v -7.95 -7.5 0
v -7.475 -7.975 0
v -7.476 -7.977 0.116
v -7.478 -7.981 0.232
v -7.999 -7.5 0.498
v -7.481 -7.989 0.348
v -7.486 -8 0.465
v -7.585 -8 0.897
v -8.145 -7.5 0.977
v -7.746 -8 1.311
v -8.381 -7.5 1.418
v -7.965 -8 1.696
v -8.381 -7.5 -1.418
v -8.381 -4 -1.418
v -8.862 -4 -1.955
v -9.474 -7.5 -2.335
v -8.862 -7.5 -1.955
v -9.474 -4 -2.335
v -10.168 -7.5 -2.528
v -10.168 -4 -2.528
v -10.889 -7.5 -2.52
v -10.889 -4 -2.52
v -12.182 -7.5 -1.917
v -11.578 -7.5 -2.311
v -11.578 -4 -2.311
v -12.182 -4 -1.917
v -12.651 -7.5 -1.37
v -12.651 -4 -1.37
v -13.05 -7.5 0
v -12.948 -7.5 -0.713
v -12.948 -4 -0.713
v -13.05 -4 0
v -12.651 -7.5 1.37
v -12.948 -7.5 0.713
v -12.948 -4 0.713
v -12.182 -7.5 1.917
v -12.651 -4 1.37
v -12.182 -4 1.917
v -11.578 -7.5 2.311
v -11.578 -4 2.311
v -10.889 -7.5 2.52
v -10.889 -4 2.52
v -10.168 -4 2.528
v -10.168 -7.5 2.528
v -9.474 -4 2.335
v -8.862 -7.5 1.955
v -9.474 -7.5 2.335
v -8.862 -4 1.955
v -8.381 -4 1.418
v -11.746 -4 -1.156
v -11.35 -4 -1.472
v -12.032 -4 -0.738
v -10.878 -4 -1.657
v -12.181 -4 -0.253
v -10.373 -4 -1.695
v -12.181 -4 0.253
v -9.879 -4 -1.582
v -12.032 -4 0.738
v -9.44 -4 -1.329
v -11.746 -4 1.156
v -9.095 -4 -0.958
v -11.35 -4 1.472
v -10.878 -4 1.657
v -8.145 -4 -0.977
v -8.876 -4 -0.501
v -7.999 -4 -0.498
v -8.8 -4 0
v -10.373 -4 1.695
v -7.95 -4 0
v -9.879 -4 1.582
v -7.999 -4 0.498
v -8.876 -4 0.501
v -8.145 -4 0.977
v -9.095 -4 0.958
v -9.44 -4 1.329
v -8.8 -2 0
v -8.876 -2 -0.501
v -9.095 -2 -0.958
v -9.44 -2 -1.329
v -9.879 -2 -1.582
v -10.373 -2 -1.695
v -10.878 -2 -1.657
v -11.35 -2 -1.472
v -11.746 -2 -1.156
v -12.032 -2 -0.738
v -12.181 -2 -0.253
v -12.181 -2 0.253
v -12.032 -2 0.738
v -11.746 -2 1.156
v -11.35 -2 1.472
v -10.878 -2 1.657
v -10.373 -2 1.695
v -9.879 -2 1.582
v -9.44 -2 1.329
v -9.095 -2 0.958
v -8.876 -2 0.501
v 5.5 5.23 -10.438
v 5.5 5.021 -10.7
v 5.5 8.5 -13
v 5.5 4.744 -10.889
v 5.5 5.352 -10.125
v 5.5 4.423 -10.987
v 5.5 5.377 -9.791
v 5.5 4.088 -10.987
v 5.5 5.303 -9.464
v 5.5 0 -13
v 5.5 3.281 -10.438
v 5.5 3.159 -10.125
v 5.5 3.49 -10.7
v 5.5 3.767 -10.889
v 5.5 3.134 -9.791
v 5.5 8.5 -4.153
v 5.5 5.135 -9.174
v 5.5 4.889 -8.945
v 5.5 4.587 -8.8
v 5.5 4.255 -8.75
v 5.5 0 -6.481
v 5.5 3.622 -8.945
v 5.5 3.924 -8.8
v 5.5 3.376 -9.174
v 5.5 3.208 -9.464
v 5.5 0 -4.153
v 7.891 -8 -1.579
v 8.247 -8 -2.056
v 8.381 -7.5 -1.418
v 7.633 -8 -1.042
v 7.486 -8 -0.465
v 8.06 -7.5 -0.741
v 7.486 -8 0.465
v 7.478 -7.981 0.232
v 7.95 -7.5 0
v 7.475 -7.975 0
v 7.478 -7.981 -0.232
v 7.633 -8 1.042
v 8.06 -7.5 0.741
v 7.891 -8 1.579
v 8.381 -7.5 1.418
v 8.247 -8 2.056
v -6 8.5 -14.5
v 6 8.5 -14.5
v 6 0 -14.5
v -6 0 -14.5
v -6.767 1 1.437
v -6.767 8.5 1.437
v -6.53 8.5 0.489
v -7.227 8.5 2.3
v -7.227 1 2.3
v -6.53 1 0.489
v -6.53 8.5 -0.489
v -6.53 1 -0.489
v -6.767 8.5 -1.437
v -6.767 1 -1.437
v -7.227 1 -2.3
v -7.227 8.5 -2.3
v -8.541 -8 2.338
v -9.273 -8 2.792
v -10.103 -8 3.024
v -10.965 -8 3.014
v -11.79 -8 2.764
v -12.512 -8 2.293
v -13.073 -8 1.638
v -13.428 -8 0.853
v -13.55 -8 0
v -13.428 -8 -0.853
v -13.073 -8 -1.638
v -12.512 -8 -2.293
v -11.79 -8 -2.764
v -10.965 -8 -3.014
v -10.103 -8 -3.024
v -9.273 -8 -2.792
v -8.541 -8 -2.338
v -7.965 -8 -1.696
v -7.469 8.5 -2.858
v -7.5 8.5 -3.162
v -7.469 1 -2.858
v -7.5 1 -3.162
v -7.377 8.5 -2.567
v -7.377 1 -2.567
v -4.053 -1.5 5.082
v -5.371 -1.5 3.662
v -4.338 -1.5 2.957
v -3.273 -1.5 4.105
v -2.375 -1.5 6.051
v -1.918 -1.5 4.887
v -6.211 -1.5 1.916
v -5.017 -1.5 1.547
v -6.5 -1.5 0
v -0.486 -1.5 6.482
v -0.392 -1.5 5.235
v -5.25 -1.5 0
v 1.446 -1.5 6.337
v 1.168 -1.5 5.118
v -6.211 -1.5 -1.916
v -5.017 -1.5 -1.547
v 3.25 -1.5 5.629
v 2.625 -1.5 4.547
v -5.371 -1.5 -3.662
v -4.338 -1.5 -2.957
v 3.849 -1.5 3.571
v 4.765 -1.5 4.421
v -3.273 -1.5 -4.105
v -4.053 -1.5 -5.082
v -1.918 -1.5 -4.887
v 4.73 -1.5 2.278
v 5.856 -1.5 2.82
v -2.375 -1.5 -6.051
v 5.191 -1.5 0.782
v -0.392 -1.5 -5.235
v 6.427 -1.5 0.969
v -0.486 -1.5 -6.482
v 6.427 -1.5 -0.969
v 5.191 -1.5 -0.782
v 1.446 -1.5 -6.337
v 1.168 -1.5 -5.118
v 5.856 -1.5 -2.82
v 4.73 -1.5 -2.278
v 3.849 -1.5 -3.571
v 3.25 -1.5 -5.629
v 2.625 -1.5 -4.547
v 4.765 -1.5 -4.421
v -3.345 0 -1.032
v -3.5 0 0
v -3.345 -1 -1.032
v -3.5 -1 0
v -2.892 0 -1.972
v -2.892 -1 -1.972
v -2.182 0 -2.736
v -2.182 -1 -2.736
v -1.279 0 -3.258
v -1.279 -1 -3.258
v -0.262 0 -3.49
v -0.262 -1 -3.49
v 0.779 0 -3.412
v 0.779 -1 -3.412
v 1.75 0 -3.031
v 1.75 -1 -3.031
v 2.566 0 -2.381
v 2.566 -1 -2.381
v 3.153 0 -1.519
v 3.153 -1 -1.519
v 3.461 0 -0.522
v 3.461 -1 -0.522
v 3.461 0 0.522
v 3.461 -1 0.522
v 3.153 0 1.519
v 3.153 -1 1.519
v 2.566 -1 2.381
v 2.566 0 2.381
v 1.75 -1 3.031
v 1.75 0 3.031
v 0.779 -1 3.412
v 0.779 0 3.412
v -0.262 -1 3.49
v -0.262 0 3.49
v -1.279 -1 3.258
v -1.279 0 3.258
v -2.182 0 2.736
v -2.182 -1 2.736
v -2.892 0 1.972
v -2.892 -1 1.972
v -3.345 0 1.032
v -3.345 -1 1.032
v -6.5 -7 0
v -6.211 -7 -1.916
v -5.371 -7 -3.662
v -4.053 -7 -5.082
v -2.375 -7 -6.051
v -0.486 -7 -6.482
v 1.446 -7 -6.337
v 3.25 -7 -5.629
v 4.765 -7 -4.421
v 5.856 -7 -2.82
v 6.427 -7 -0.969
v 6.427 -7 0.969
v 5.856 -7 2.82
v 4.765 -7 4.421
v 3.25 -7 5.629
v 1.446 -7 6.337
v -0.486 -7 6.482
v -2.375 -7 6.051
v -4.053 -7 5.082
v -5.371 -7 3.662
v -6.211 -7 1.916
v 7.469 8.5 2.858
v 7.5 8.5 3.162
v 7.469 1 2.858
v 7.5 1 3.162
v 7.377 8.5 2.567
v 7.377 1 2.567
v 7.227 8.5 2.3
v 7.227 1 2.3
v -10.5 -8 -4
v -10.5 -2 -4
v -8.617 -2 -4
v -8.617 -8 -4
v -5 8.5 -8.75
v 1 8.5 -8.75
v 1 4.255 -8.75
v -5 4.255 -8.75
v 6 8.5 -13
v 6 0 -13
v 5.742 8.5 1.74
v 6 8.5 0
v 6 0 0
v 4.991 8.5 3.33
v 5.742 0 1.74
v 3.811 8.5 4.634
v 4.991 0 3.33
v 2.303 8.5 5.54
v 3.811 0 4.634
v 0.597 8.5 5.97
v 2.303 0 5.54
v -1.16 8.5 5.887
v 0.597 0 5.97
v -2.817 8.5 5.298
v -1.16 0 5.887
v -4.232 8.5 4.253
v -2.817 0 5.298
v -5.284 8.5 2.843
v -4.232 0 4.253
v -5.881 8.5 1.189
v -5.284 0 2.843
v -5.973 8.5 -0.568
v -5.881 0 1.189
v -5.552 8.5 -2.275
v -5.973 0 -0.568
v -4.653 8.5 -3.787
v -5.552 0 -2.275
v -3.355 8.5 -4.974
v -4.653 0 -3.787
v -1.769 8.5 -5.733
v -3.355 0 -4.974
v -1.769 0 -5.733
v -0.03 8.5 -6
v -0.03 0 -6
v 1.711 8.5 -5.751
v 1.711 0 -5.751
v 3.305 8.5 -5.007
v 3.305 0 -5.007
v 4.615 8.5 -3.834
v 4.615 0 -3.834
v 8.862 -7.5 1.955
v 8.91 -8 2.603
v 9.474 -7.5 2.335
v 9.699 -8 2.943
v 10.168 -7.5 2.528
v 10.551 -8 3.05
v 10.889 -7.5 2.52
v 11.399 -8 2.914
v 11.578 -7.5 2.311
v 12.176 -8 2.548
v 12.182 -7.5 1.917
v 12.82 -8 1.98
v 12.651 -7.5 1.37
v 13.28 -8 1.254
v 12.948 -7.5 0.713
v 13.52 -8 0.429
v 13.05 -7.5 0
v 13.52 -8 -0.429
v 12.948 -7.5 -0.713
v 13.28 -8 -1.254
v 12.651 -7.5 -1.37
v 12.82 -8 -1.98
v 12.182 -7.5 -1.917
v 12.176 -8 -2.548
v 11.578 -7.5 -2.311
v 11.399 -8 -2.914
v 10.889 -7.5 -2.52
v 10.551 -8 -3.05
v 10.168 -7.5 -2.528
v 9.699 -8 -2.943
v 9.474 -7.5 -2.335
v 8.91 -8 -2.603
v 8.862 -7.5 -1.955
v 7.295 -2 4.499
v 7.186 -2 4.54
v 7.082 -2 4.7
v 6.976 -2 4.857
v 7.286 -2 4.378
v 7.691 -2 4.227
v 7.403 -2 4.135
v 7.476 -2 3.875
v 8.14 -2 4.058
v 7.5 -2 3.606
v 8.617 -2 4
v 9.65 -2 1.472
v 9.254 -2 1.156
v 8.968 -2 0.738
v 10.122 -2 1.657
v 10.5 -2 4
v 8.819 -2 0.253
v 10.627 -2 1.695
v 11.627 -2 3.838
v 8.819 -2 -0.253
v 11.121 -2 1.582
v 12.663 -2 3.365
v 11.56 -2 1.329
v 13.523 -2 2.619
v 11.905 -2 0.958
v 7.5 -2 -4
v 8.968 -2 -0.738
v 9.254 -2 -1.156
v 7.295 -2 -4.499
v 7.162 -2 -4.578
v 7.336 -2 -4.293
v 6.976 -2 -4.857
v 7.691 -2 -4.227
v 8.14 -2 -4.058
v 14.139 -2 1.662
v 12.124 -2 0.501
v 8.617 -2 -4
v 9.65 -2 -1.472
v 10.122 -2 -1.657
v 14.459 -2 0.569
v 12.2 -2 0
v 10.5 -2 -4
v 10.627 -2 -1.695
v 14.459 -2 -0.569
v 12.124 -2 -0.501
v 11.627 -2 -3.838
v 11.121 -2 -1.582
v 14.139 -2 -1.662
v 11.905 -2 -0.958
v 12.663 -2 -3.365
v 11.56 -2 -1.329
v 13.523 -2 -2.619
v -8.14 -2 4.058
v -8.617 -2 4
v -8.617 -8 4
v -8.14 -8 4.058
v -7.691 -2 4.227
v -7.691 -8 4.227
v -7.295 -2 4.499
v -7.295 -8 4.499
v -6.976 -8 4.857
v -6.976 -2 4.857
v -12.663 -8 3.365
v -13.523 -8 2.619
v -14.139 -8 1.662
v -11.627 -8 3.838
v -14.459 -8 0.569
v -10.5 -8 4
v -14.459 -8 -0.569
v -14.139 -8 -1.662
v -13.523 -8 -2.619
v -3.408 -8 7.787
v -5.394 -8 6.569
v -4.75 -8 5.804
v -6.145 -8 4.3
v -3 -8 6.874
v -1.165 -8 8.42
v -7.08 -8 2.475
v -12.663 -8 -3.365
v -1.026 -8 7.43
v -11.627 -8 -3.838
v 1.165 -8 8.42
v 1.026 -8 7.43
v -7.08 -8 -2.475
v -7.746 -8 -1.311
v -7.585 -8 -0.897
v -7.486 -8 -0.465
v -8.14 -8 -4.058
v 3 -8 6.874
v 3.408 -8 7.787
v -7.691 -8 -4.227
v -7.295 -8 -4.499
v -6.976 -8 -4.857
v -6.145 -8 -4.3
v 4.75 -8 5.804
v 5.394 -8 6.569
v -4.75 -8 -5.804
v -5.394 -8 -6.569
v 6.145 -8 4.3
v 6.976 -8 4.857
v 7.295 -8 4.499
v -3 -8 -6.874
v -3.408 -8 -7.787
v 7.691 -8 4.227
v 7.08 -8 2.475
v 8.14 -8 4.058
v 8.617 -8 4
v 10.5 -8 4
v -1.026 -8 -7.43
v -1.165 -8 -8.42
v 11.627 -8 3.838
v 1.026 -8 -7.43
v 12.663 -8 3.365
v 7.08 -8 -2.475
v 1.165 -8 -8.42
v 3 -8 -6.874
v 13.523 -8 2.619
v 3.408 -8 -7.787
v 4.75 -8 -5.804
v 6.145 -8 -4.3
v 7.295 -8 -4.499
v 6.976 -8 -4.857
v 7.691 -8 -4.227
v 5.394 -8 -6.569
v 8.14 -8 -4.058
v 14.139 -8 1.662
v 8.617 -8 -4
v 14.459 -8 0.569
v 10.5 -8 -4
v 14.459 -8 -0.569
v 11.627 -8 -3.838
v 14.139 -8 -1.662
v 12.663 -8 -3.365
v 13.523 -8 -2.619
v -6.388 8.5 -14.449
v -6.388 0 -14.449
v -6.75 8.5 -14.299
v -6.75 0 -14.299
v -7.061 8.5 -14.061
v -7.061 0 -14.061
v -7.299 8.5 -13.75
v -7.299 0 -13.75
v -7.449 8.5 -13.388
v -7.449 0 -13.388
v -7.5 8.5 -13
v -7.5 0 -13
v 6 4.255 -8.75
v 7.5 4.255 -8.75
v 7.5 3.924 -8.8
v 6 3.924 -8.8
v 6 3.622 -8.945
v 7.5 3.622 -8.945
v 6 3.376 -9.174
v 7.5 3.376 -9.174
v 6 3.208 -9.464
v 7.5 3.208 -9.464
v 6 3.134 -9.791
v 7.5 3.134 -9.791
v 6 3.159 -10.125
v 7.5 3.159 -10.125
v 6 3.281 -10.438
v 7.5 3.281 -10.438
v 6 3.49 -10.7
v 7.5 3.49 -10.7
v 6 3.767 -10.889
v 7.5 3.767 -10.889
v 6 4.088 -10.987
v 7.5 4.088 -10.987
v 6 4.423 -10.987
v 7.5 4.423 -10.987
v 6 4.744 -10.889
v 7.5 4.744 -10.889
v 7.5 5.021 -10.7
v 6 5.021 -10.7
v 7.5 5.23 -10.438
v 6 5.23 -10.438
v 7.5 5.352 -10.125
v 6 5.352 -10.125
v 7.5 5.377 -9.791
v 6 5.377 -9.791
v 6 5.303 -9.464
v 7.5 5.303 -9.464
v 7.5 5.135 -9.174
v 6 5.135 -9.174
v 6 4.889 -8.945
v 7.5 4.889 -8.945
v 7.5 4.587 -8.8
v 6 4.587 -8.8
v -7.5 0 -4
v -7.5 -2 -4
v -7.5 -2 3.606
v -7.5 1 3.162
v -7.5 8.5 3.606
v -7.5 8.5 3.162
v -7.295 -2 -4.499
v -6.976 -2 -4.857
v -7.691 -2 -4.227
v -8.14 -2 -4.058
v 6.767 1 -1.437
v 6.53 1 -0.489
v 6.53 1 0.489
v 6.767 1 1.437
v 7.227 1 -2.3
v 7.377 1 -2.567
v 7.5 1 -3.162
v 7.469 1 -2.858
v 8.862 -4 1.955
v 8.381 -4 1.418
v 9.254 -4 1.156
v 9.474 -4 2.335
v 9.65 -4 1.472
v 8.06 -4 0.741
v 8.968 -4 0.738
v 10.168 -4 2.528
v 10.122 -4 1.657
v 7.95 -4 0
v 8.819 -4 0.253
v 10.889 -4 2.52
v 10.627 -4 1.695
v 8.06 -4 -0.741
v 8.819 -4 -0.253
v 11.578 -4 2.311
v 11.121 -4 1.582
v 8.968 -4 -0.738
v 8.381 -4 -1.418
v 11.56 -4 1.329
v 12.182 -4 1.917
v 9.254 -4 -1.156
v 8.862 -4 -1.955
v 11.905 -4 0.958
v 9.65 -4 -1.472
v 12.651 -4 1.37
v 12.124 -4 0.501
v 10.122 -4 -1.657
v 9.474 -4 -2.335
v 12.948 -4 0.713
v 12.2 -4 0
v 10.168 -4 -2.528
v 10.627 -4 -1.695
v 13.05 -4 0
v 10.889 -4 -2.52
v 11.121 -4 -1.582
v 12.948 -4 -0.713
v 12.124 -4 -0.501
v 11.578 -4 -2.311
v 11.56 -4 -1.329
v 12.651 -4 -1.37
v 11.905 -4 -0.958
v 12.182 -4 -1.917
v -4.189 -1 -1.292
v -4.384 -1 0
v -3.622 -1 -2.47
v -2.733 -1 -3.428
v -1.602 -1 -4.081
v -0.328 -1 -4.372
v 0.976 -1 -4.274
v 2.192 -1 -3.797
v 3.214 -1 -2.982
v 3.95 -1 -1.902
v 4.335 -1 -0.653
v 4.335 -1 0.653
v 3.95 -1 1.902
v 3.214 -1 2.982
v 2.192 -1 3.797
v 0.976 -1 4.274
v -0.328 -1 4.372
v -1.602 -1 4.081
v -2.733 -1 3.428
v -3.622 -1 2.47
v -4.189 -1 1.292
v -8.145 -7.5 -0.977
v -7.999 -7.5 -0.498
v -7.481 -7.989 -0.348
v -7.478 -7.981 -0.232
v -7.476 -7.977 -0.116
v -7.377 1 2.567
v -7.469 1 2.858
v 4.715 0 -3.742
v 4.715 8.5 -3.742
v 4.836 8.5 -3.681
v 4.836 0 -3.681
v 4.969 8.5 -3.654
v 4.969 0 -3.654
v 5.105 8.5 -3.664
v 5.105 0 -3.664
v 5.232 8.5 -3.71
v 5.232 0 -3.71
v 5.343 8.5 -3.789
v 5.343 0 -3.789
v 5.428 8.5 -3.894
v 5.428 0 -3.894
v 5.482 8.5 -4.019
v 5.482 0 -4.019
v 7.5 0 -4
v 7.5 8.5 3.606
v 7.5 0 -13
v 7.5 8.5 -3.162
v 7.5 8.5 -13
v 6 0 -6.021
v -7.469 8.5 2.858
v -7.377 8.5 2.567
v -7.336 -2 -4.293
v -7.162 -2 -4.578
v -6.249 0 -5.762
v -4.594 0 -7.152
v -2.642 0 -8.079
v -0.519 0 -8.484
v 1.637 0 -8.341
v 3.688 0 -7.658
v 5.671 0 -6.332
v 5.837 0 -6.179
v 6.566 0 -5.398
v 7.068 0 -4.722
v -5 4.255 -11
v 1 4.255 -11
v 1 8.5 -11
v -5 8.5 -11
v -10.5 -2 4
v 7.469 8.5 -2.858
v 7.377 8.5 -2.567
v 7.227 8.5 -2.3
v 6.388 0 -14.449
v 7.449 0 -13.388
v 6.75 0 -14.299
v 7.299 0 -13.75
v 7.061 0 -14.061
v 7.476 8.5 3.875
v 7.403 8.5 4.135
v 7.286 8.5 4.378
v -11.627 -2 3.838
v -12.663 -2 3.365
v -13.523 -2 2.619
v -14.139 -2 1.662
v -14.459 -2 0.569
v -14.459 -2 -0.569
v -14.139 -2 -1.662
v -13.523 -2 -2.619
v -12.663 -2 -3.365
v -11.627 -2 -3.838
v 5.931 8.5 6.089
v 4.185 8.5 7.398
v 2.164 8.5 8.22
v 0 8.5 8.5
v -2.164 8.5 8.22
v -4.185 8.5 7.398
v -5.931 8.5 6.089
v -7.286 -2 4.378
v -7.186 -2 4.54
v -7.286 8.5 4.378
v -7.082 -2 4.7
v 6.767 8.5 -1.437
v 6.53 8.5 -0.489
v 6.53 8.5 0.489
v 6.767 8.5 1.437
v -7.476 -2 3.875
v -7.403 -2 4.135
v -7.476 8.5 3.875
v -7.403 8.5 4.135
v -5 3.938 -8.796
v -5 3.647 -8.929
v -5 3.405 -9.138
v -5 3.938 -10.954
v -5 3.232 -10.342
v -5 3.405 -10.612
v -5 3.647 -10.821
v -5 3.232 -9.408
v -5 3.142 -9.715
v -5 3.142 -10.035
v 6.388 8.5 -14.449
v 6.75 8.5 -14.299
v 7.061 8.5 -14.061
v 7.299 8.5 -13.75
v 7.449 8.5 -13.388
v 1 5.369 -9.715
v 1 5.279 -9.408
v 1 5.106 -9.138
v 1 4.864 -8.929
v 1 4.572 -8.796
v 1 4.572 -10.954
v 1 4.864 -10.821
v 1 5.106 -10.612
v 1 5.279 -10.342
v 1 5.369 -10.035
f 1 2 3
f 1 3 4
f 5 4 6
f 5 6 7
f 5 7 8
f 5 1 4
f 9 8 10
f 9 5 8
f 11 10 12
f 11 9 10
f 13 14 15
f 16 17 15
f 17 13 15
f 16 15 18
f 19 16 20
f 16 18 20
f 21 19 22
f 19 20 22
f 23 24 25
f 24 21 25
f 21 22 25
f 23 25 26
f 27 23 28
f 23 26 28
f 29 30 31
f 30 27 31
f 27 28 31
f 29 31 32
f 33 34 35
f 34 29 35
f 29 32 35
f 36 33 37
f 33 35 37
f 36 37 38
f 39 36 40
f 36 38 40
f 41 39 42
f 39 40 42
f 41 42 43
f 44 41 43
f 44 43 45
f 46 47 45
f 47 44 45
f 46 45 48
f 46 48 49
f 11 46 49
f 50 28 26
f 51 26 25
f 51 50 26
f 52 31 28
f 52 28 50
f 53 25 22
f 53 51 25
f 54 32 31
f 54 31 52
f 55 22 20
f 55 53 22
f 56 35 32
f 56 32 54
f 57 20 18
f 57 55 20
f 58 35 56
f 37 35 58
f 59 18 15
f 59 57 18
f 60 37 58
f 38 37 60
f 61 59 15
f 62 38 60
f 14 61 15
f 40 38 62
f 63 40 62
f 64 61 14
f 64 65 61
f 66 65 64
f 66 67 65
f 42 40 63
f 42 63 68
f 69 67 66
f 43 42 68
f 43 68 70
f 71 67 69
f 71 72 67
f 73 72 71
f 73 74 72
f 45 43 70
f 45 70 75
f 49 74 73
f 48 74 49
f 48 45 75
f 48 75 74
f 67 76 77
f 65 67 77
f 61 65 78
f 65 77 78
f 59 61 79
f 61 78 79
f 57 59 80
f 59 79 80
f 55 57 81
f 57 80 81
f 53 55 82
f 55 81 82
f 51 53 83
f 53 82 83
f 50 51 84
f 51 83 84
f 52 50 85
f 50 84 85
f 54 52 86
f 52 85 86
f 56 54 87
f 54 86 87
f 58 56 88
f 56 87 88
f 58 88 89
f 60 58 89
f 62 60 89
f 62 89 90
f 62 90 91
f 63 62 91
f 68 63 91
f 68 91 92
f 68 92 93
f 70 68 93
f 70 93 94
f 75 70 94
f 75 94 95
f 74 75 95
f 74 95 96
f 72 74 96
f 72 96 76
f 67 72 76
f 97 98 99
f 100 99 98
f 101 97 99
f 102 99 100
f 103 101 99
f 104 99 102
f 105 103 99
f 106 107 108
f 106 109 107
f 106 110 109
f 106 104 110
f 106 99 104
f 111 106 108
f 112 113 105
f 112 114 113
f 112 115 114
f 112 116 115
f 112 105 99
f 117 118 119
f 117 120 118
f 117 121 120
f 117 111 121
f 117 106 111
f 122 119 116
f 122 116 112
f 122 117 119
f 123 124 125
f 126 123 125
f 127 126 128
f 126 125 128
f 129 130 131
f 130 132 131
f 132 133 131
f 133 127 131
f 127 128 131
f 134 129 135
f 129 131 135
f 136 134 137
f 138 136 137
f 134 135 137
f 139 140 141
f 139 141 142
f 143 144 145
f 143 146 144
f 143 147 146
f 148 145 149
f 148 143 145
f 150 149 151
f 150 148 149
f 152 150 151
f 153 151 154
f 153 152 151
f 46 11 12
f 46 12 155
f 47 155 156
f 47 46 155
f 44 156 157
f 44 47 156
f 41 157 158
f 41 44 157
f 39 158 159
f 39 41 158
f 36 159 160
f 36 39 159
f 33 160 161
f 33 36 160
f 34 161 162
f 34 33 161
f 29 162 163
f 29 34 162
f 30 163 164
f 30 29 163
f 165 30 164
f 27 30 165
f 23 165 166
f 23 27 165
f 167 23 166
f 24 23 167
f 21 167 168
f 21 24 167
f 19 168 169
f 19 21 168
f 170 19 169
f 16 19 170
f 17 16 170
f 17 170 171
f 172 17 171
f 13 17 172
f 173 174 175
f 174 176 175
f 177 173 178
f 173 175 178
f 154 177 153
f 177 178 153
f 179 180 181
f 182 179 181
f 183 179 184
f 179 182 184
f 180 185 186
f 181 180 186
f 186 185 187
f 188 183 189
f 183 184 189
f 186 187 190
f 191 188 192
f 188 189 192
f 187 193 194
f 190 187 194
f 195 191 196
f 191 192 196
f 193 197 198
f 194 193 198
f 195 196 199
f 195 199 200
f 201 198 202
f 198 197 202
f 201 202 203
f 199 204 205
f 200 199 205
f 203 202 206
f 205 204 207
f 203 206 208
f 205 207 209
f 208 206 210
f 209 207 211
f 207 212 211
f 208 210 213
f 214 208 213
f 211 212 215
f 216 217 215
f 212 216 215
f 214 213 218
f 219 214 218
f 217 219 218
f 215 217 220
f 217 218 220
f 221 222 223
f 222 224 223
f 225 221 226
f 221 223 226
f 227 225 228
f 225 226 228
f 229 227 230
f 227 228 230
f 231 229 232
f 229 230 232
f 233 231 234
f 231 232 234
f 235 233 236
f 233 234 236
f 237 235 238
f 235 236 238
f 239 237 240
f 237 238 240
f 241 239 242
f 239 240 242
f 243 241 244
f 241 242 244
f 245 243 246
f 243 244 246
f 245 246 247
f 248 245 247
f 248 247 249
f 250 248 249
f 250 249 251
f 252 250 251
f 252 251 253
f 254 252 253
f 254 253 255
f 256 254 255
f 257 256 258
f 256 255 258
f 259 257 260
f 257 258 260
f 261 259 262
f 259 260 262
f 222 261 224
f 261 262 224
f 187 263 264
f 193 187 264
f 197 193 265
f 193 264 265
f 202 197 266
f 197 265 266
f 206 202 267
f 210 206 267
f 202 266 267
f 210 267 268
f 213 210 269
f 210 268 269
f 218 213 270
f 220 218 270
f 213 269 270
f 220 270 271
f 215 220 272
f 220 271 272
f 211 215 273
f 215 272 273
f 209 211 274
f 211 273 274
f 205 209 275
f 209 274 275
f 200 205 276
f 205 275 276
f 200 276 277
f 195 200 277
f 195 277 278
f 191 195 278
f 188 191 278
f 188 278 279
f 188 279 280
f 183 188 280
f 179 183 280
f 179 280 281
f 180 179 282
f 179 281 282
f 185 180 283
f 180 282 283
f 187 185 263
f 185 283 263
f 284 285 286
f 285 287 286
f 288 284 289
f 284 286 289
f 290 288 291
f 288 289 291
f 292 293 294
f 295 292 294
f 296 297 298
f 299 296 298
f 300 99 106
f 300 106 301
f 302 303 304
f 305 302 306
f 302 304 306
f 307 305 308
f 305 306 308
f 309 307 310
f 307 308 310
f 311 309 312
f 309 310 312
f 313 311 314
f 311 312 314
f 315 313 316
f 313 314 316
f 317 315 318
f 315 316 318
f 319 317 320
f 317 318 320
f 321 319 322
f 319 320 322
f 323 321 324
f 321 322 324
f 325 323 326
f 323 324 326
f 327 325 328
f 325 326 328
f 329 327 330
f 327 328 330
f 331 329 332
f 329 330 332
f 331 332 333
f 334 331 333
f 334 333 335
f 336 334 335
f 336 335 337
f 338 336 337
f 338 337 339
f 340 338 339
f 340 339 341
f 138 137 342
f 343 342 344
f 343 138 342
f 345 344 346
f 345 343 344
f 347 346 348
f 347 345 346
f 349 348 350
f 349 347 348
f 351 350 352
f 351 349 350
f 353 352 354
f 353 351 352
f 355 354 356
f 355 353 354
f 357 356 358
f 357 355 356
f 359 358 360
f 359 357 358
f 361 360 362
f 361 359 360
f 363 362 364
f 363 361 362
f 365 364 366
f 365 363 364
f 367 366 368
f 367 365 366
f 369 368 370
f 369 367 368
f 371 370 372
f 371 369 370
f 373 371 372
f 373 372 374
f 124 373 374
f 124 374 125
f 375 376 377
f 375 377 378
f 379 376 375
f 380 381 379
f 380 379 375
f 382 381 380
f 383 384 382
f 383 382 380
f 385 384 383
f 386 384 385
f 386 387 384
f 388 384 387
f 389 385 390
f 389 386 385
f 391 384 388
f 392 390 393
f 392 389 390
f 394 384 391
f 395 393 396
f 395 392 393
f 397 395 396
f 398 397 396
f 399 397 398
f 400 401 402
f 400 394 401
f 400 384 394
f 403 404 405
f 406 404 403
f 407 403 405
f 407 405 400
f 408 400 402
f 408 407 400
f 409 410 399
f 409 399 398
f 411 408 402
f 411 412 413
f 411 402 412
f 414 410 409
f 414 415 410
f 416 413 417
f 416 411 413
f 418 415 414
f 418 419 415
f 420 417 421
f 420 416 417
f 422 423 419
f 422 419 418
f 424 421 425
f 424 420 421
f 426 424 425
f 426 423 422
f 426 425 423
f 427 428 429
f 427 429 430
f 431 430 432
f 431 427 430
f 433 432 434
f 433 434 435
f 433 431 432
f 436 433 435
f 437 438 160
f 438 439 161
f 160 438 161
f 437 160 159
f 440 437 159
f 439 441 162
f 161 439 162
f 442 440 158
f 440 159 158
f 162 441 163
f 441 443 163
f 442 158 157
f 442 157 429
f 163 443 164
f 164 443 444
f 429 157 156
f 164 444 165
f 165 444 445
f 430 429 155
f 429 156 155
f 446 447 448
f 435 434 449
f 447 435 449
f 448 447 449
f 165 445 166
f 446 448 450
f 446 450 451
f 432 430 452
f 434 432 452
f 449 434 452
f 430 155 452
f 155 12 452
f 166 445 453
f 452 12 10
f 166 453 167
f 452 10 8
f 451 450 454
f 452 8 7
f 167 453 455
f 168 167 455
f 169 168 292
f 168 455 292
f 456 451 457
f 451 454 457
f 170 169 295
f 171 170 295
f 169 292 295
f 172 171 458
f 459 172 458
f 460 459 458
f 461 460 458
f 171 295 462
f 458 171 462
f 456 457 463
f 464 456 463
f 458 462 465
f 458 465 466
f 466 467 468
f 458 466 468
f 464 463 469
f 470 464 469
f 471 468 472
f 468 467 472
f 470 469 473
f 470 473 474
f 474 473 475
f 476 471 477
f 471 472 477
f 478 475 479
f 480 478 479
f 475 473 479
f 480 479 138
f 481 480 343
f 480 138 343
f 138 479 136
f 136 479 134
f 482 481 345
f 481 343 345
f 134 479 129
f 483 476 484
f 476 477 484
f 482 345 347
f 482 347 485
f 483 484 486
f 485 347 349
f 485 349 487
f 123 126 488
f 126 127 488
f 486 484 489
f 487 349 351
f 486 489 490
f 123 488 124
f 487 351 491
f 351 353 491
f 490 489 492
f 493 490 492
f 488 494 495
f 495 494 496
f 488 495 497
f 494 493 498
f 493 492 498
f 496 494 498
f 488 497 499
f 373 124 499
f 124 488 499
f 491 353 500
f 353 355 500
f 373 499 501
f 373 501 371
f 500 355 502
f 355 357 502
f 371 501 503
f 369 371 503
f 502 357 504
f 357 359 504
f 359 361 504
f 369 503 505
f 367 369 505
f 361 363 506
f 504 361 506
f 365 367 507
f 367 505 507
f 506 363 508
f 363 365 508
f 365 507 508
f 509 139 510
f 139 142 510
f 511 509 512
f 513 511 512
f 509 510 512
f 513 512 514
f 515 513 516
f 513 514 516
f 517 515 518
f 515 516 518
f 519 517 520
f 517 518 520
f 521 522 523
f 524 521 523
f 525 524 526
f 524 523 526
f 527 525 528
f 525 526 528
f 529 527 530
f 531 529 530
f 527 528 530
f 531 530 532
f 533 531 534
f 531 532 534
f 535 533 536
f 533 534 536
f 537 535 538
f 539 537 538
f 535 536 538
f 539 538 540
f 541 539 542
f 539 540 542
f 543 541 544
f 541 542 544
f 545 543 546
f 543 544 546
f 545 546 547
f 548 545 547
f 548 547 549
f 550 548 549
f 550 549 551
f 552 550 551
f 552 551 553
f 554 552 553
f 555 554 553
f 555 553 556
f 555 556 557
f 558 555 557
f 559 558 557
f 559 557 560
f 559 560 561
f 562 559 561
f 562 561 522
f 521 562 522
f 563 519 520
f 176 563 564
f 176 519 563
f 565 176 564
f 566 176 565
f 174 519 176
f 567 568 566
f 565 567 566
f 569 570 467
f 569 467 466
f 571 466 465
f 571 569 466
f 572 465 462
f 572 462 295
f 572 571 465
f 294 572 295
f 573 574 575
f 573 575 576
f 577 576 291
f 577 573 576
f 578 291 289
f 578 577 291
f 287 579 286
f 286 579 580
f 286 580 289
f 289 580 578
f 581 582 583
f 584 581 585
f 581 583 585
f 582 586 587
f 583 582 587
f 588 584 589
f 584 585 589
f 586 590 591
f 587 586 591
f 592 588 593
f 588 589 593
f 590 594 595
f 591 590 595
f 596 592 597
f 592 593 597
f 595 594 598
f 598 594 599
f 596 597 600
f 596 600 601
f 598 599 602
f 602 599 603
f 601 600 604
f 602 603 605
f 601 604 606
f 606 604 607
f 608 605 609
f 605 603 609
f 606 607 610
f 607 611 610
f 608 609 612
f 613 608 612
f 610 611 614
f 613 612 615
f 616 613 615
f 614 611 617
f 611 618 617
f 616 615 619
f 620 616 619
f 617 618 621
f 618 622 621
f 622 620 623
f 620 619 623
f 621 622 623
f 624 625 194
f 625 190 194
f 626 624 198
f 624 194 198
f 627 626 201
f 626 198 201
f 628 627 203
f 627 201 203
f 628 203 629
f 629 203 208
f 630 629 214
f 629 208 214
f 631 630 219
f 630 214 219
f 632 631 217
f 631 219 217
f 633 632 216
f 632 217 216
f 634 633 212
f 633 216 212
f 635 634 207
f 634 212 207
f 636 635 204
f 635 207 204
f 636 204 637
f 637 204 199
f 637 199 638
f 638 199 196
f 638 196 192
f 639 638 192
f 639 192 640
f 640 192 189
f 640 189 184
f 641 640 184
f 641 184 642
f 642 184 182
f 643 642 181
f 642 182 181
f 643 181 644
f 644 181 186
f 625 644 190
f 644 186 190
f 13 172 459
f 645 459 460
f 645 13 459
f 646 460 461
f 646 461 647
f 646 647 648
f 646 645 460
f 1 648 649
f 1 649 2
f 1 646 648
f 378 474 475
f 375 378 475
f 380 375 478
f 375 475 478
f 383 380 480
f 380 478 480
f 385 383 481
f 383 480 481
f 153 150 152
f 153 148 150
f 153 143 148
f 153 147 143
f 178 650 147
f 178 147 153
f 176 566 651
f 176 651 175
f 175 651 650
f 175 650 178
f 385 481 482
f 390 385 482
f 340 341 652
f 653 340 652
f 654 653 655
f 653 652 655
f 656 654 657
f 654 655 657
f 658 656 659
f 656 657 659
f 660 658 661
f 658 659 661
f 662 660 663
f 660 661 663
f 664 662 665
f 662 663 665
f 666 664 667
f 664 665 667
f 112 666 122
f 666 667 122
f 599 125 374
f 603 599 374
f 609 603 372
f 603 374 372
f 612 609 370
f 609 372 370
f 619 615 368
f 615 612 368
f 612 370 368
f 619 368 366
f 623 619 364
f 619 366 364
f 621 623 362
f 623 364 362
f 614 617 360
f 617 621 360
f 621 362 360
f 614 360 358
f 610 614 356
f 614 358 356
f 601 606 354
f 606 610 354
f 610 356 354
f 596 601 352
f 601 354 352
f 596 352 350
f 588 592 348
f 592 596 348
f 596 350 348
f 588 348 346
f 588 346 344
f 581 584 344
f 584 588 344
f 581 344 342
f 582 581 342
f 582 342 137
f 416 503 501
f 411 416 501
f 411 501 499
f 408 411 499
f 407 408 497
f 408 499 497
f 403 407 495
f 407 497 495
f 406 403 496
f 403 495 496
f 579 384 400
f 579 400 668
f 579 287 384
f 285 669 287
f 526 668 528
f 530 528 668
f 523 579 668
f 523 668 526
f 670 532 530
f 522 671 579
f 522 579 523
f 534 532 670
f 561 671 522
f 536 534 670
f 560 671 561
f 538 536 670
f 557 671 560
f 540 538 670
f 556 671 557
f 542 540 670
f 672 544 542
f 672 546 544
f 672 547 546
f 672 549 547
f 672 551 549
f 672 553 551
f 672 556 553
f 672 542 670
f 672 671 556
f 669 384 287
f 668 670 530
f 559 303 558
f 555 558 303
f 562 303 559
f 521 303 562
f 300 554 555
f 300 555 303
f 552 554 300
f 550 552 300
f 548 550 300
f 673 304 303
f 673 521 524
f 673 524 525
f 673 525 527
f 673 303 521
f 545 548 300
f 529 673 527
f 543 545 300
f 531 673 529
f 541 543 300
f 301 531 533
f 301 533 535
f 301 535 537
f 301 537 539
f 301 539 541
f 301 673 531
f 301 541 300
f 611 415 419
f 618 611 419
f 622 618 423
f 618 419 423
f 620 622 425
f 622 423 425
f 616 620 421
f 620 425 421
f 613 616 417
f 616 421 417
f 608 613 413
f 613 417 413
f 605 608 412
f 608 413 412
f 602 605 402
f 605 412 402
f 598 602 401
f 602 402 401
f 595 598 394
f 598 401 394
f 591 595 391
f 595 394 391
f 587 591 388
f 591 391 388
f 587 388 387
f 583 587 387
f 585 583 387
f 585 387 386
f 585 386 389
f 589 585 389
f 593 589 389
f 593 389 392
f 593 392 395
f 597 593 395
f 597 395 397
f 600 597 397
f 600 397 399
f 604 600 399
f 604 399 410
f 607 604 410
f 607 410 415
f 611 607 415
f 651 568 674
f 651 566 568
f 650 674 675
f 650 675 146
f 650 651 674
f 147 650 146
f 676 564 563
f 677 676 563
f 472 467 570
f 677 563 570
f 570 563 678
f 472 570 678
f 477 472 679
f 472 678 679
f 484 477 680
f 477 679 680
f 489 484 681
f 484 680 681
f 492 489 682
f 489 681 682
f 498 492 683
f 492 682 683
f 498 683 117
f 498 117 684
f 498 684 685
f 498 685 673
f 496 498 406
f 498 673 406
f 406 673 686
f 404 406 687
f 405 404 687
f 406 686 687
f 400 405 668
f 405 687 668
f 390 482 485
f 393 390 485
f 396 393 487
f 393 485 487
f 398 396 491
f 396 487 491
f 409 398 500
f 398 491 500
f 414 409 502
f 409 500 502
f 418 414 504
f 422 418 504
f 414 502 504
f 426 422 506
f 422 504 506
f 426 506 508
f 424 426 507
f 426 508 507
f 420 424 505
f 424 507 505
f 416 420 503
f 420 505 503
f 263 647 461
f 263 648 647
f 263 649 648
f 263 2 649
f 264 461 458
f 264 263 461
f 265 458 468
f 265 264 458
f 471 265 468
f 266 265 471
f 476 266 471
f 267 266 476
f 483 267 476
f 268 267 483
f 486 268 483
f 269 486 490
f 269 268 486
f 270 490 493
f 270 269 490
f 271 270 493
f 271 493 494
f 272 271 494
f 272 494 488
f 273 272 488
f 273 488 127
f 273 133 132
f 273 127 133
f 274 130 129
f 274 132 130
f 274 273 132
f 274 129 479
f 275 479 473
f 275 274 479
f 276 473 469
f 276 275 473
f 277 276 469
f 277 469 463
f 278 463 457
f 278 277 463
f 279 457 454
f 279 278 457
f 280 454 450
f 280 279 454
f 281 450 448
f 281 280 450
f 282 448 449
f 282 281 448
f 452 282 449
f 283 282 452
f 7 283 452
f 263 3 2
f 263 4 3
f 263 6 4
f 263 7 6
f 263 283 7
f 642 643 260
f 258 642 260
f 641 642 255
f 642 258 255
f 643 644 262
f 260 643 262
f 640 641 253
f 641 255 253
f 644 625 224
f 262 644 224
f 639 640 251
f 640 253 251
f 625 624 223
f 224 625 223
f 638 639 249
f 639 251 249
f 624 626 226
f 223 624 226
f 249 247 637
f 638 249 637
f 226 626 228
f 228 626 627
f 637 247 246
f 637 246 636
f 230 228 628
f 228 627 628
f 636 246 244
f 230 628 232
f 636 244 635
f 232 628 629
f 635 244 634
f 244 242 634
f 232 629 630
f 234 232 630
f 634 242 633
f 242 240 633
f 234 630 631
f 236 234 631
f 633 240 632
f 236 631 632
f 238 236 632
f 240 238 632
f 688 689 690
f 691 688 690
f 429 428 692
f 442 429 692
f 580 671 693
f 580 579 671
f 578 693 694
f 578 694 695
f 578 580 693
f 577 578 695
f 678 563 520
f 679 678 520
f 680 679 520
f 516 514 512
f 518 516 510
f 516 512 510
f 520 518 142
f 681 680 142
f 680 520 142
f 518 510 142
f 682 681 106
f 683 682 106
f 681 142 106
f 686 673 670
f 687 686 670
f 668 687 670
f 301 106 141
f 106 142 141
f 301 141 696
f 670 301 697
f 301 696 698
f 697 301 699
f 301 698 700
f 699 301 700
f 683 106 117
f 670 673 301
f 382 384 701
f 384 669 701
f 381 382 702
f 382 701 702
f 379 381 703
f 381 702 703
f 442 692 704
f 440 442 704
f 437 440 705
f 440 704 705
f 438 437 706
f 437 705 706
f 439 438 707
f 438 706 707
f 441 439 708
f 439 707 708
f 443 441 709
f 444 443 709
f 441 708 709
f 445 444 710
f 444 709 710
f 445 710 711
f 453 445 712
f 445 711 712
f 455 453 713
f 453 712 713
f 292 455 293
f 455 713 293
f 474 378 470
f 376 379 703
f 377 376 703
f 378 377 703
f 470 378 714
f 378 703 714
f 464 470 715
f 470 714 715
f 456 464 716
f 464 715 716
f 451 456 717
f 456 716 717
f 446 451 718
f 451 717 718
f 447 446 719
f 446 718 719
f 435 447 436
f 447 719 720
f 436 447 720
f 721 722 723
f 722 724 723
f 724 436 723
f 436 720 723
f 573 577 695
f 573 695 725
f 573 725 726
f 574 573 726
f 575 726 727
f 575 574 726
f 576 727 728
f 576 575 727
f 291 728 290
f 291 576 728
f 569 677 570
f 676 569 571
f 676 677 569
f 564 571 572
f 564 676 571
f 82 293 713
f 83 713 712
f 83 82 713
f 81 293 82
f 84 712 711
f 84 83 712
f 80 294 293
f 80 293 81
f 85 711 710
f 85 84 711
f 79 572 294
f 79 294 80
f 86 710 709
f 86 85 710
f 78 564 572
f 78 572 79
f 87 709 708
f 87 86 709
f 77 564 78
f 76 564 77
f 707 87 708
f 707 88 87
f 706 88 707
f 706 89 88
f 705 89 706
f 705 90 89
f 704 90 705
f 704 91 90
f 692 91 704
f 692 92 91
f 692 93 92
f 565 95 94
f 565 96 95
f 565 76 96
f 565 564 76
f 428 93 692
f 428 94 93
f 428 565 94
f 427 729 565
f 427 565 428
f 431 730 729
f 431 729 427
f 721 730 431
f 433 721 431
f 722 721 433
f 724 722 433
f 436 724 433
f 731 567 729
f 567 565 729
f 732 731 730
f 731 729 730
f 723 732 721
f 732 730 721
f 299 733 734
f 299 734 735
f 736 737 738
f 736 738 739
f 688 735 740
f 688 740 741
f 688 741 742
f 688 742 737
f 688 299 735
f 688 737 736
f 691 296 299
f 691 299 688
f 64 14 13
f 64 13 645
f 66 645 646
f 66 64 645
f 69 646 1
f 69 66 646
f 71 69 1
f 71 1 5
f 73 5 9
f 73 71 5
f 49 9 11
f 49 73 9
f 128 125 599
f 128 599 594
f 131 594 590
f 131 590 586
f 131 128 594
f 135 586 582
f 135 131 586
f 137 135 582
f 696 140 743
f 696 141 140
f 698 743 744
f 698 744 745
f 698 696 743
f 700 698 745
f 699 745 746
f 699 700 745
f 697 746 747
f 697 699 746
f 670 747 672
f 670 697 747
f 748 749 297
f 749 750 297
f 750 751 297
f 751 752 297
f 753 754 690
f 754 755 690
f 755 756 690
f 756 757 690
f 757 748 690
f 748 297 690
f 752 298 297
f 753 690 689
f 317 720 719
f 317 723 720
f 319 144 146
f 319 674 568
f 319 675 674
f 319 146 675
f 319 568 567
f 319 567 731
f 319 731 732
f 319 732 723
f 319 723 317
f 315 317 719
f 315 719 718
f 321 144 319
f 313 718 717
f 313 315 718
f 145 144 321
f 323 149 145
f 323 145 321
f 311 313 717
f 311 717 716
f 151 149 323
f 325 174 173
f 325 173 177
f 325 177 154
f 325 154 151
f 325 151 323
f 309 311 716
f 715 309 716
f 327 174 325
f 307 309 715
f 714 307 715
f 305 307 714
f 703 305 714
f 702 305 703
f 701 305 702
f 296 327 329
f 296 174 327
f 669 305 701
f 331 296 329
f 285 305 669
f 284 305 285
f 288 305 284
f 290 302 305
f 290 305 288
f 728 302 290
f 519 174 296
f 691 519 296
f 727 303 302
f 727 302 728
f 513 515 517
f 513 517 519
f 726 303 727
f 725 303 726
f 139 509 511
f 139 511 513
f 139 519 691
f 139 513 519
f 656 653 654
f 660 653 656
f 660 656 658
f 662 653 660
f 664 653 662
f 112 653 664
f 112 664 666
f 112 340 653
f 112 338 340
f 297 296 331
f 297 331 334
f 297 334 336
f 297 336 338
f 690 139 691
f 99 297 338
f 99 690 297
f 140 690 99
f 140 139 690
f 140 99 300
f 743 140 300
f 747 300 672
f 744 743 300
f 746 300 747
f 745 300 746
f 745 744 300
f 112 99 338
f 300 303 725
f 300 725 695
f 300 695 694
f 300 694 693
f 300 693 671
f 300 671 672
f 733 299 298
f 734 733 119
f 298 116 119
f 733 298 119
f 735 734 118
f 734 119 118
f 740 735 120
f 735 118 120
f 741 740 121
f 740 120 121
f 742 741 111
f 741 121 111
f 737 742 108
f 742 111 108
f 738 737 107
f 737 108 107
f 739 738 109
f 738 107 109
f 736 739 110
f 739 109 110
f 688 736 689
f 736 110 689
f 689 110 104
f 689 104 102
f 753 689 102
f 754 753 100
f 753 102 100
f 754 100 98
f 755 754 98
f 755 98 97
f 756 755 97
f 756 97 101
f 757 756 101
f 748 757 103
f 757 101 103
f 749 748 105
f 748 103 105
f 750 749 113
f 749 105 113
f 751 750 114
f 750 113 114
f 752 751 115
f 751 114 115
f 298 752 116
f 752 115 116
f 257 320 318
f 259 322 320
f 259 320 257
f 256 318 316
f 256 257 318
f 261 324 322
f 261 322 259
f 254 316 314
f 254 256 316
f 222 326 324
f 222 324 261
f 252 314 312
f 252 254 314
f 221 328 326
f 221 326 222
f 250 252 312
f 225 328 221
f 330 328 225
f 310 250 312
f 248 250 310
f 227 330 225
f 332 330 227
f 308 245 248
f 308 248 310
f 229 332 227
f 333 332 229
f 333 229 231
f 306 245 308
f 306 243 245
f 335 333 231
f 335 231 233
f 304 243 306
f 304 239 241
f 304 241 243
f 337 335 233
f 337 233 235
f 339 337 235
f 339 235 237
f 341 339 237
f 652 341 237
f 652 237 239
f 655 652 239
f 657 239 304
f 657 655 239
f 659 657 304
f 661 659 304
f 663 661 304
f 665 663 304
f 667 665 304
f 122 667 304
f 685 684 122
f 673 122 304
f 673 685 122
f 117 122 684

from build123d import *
from build123d.topology import SkipClean

# Parameters (mm, degrees)
BOSS_EXTRU_1_START      = -6
BOSS_EXTRU_1_DEPTH      = 6
BOSS_EXTRU_2_START      = -6
BOSS_EXTRU_2_DEPTH      = 2
ENL_V_START             = -4
ENL_V_MAT_EXTRU_1_DEPTH = 4
ENL_V_START_2           = -16.5
ENL_V_MAT_EXTRU_5_DEPTH = 10.5
CONG_1_R                = 2
CHANFREIN1_SIZE         = 0.5
SYM_TRIE1_START         = -2
SYM_TRIE1_DEPTH         = 10.5
SYM_TRIE1_START_2       = -8
SYM_TRIE1_2_DEPTH       = 4
SYM_TRIE1_START_3       = -7.5000001
SYM_TRIE1_3_DEPTH       = 5.5000001
SYM_TRIE1_START_4       = -4
SYM_TRIE1_4_DEPTH       = 2
SYM_TRIE1_7_DEPTH       = 0.4999999
M3_CLEARANCE_HOLE1_D    = 3.4
BOSS_EXTRU_3_DEPTH      = 8.5
ENL_V_START_3           = -8.5
ENL_V_MAT_EXTRU_2_DEPTH = 8.5
ENL_V_START_4           = -6.5
ESQUISSE5_R             = 1.125
ENL_V_MAT_EXTRU_3_DEPTH = 6
ESQUISSE5_3_R           = 1.125
ENL_V_MAT_EXTRU_4_DEPTH = 6.5
CONG_2_R                = 0.5
CONG_3_R                = 1.5
ENL_V_START_5           = -7.5
ESQUISSE9_R             = 4
ENL_V_MAT_EXTRU_8_DEPTH = 7.5
CONG_5_R                = 1.5
CHANFREIN2_SIZE         = 1


with BuildPart() as part:
    # Esquisse1 → Révolution1 (revolve)
    with BuildSketch(Plane.XY):
        Polygon((-8.5, 8.5), (-6, 8.5), (-6, 0), (-3.5, 0), (-3.5, -1), (-4.383974596, -1), (-5.25, -1.5), (-6.5, -1.5), (-6.5, -8), (-8.5, -8), align=None)
    revolve(axis=Axis((0, 6.43509573, 0), (0, -1, 0)))

    # Esquisse3 → Boss.-Extru.1 (add)
    with BuildSketch(Plane.XZ.offset(8).offset(BOSS_EXTRU_1_START)):
        with BuildLine():
            ThreePointArc((-7.928571429, 3.06394437), (-7.728470361, 3.5384666), (-7.5, 4))
            Line((-7.5, 4), (-10.5, 4))
            ThreePointArc((-10.5, 4), (-14.5, 0), (-10.5, -4))
            Line((-10.5, -4), (-7.5, -4))
            ThreePointArc((-7.5, -4), (-7.728470361, -3.5384666), (-7.928571429, -3.06394437))
            ThreePointArc((-7.928571429, -3.06394437), (-8.196108254, -2.252511816), (-8.380833333, -1.418320358))
            ThreePointArc((-8.380833333, -1.418320358), (-13.05, 0), (-8.380833333, 1.418320358))
            ThreePointArc((-8.380833333, 1.418320358), (-8.196108254, 2.252511816), (-7.928571429, 3.06394437))
        make_face()
    extrude(amount=BOSS_EXTRU_1_DEPTH)

    # Esquisse3<4> → Boss.-Extru.2 (add)
    with BuildSketch(Plane.XZ.offset(8).offset(BOSS_EXTRU_2_START)):
        with BuildLine():
            ThreePointArc((-8.380833333, -1.418320358), (-8.5, 0), (-8.380833333, 1.418320358))
            ThreePointArc((-8.380833333, 1.418320358), (-13.05, 0), (-8.380833333, -1.418320358))
        make_face()
    extrude(amount=BOSS_EXTRU_2_DEPTH)

    # Esquisse3<5> → Enlèv. mat.-Extru.1 (cut)
    with SkipClean():  # the faces are left unmerged after this step: merging them gives an invalid solid
        with BuildSketch(Plane.XZ.offset(8).offset(ENL_V_START)):
            with BuildLine():
                ThreePointArc((-7.95, 0), (-8.06008453, 0.741156191), (-8.380833333, 1.418320358))
                ThreePointArc((-8.380833333, 1.418320358), (-8.5, 0), (-8.380833333, -1.418320358))
                ThreePointArc((-8.380833333, -1.418320358), (-8.06008453, -0.741156191), (-7.95, 0))
            make_face()
        extrude(amount=ENL_V_MAT_EXTRU_1_DEPTH, mode=Mode.SUBTRACT)

    # Esquisse3<7> → Enlèv. mat.-Extru.5 (cut)
    with SkipClean():  # the faces are left unmerged after this step: merging them gives an invalid solid
        with BuildSketch(Plane.XZ.offset(8).offset(ENL_V_START_2)):
            with BuildLine():
                ThreePointArc((-7.5, 4), (-8.5, 0), (-7.5, -4))
                Line((-7.5, -4), (-7.5, 4))
            make_face()
        extrude(amount=ENL_V_MAT_EXTRU_5_DEPTH, mode=Mode.SUBTRACT)

    # Congé1
    # the kernel refuses this fillet: 2 mm, written as the material it adds along each edge
    with BuildSketch(Plane(origin=(-7.5, -2, 4), x_dir=(0.5219209843200922, 0, 0.8529938370975175), z_dir=(0, -1, 0))) as cong_1_piece_1:
        with BuildLine():
            CenterArc((1.12308337, 1.996502992), CONG_1_R, 211.461195757, 55.150095421)
            Line((-0.582904304, 0.952661023), (0, 0))
            ThreePointArc((0, 0), (0.502432034, 0.014862284), (1.004864068, 0))
        make_face()
    extrude(amount=6)
    with BuildSketch(Plane(origin=(-7.5, -2, -4), x_dir=(0.521920984320094, 0, -0.8529938370975163), z_dir=(0, -1, 0))) as cong_1_piece_2:
        with BuildLine():
            CenterArc((1.12308337, -1.996502992), CONG_1_R, 93.388708822, 55.150095421)
            Line((-0.582904304, -0.952661023), (0, 0))
            ThreePointArc((0, 0), (0.502432034, -0.014862284), (1.004864068, 0))
        make_face()
    extrude(amount=6)

    # Chanfrein1
    chanfrein1_edges = [part.edges().sort_by_distance(p)[0] for p in [
        (-7.95, -8, 0),
    ]]
    chamfer(chanfrein1_edges, length=CHANFREIN1_SIZE)

    # Symétrie1: read off the stored shape, not the designer's step
    # Symétrie1 outline → Symétrie1 (cut)
    with BuildSketch(Plane(origin=(0, 0, 0), x_dir=(1, 0, 0), z_dir=(0, 1, 0)).offset(SYM_TRIE1_START)):
        with BuildLine():
            Line((7.5, 4), (7.5, -4))
            ThreePointArc((7.5, -4), (8.5, 0), (7.5, 4))
        make_face()
    extrude(amount=SYM_TRIE1_DEPTH, mode=Mode.SUBTRACT)

    # Sym_trie1 2 outline → Sym_trie1 2 (cut)
    with BuildSketch(Plane(origin=(0, 0, 0), x_dir=(1, 0, 0), z_dir=(0, 1, 0)).offset(SYM_TRIE1_START_2)):
        with BuildLine():
            ThreePointArc((8.380833333, 1.418320358), (7.95, 0), (8.380833333, -1.418320358))
            ThreePointArc((8.380833333, -1.418320358), (8.5, 0), (8.380833333, 1.418320358))
        make_face()
    extrude(amount=SYM_TRIE1_2_DEPTH, mode=Mode.SUBTRACT)

    # Sym_trie1 3 outline → Sym_trie1 3 (add)
    with BuildSketch(Plane(origin=(0, 0, 0), x_dir=(1, 0, 0), z_dir=(0, 1, 0)).offset(SYM_TRIE1_START_3)):
        with BuildLine():
            ThreePointArc((6.975540357, -4.857142857), (7.69102387, -4.227189479), (8.61684397, -4))
            Line((8.61684397, -4), (10.5, -4))
            ThreePointArc((10.5, -4), (14.5, 0), (10.5, 4))
            Line((10.5, 4), (8.61684397, 4))
            ThreePointArc((8.61684397, 4), (7.69102387, 4.227189479), (6.975540357, 4.857142857))
            ThreePointArc((6.975540357, 4.857142857), (7.868349781, 3.215442696), (8.380833333, 1.418320358))
            ThreePointArc((8.380833333, 1.418320358), (13.05, 0), (8.380833333, -1.418320358))
            ThreePointArc((8.380833333, -1.418320358), (7.868349781, -3.215442696), (6.975540357, -4.857142857))
        make_face()
    extrude(amount=SYM_TRIE1_3_DEPTH)

    # Sym_trie1 4 outline → Sym_trie1 4 (add)
    with BuildSketch(Plane(origin=(0, 0, 0), x_dir=(1, 0, 0), z_dir=(0, 1, 0)).offset(SYM_TRIE1_START_4)):
        with BuildLine():
            ThreePointArc((8.380833333, 1.418320358), (8.5, 0), (8.380833333, -1.418320358))
            ThreePointArc((8.380833333, -1.418320358), (13.05, 0), (8.380833333, 1.418320358))
        make_face()
    extrude(amount=SYM_TRIE1_4_DEPTH)

    # Sym_trie1 5 outline → Sym_trie1 5 (revolve, cut)
    with BuildSketch(Plane(origin=(10.5, 0, 0), x_dir=(1, 0, 0), z_dir=(0, 0, 1))):
        Polygon((3.05, -8), (2.55, -7.5), (2.55, -8), align=None)
    revolve(axis=Axis((10.5, 0, 0), (0, 1, 0)), mode=Mode.SUBTRACT)

    # Sym_trie1 6 outline → Sym_trie1 6 (revolve)
    with SkipClean():  # the faces are left unmerged after this step: merging them gives an invalid solid
        with BuildSketch(Plane(origin=(10.5, 0, 0), x_dir=(1, 0, 0), z_dir=(0, 0, 1))):
            Polygon((3.05, -7.5), (2.55, -7.5), (3.05, -8), align=None)
        revolve(axis=Axis((10.5, 0, 0), (0, 1, 0)))

    # Sym_trie1 7 outline → Sym_trie1 7 (add)
    with BuildSketch(Plane(origin=(0, 0, 0), x_dir=(1, 0, 0), z_dir=(0, 1, 0)).offset(SYM_TRIE1_START_2)):
        with BuildLine():
            ThreePointArc((8.2475, 2.056390953), (13.55, 0), (8.2475, -2.056390953))
            ThreePointArc((8.2475, -2.056390953), (7.933495012, -3.051173035), (7.5, -4))
            ThreePointArc((7.5, -4), (7.250447615, -4.436328367), (6.975540357, -4.857142857))
            ThreePointArc((6.975540357, -4.857142857), (7.69102387, -4.227189479), (8.61684397, -4))
            Line((8.61684397, -4), (10.5, -4))
            ThreePointArc((10.5, -4), (14.5, 0), (10.5, 4))
            Line((10.5, 4), (8.61684397, 4))
            ThreePointArc((8.61684397, 4), (7.69102387, 4.227189479), (6.975540357, 4.857142857))
            ThreePointArc((6.975540357, 4.857142857), (7.250447615, 4.436328367), (7.5, 4))
            ThreePointArc((7.5, 4), (7.933495012, 3.051173035), (8.2475, 2.056390953))
        make_face()
    extrude(amount=SYM_TRIE1_7_DEPTH)

    # M3 Clearance Hole1 (through all)
    with Locations(Plane(origin=(0, -4, 0), x_dir=(-1, 0, 0), z_dir=(0, -1, 0))):
        with Locations((10.5, 0), (-10.5, 0)):
            Hole(M3_CLEARANCE_HOLE1_D / 2)

    # Esquisse4 → Boss.-Extru.3 (add)
    with BuildSketch(Plane(origin=(0, 8.5, 0), x_dir=(1, 0, 0), z_dir=(0, 1, 0))):
        with BuildLine():
            Line((7.5, 14.5), (-7.5, 14.5))
            Line((-7.5, 14.5), (-7.5, 4))
            ThreePointArc((-7.5, 4), (-1.593272922, 8.349340177), (5.5, 6.480740698))
            Line((5.5, 6.480740698), (5.5, 13))
            Line((5.5, 13), (6, 13))
            Line((6, 13), (6, 6.020797289))
            ThreePointArc((6, 6.020797289), (6.825203691, 5.066220937), (7.5, 4))
            Line((7.5, 4), (7.5, 14.5))
        make_face()
    extrude(amount=-BOSS_EXTRU_3_DEPTH)

    # Esquisse4<3> → Enlèv. mat.-Extru.2 (cut)
    with BuildSketch(Plane(origin=(0, 8.5, 0), x_dir=(1, 0, 0), z_dir=(0, 1, 0)).offset(ENL_V_START_3)):
        with BuildLine():
            Line((6, 0), (6, 13))
            Line((6, 13), (5.5, 13))
            Line((5.5, 13), (5.5, 2.397915762))
            ThreePointArc((5.5, 2.397915762), (5.873670062, 1.224744871), (6, 0))
        make_face()
    extrude(amount=ENL_V_MAT_EXTRU_2_DEPTH, mode=Mode.SUBTRACT)

    # Esquisse5 → Enlèv. mat.-Extru.3 (cut)
    with BuildSketch(Plane(origin=(7.5, 0, 0), x_dir=(0, 0, -1), z_dir=(1, 0, 0)).offset(ENL_V_START_4)):
        with Locations((9.875, 4.2554)):
            Circle(ESQUISSE5_R)
        with BuildLine():
            Line((8.75, 8.5), (8.75, 4.2554))
            ThreePointArc((8.75, 4.2554), (9.875, 5.3804), (11, 4.2554))
            Line((11, 4.2554), (11, 8.5))
            Line((11, 8.5), (8.75, 8.5))
        make_face()
    extrude(amount=-ENL_V_MAT_EXTRU_3_DEPTH, mode=Mode.SUBTRACT)

    # Esquisse5<3> → Enlèv. mat.-Extru.4 (cut)
    with BuildSketch(Plane(origin=(7.5, 0, 0), x_dir=(0, 0, -1), z_dir=(1, 0, 0))):
        with Locations(Location((9.875, 4.2554, 0), (0, 0, 180))):
            Circle(ESQUISSE5_3_R)
    extrude(amount=-ENL_V_MAT_EXTRU_4_DEPTH, mode=Mode.SUBTRACT)

    # Congé2
    # the kernel refuses this fillet: 0.5 mm, written as the material it takes off along each edge
    with BuildSketch(Plane(origin=(5.5, 0, -2.397915762), x_dir=(0, 0, -1), z_dir=(0, 1, 0))) as cong_2_piece_1:
        with BuildLine():
            CenterArc((1.75539617, 0.5), CONG_2_R, 129.715137232, 140.284862768)
            ThreePointArc((1.435910637, 0.884615385), (0.749192225, 0.391603841), (0, 0))
            Line((0, 0), (1.75539617, 0))
        make_face()
    extrude(amount=12.888490425, mode=Mode.SUBTRACT)

    # Congé3
    cong_3_edges = [part.edges().sort_by_distance(p)[0] for p in [
        (7.5, 3.25, 4),
        (7.5, 4.25, -14.5),
        (-7.5, 4.25, -14.5),
        (-7.5, 3.25, 4),
    ]]
    fillet(cong_3_edges, radius=CONG_3_R)

    # Esquisse9 → Enlèv. mat.-Extru.8 (cut)
    with BuildSketch(Plane(origin=(0, 8.5, 0), x_dir=(1, 0, 0), z_dir=(0, 1, 0)).offset(ENL_V_START_5)):
        with Locations((-10.5, 0)):
            Circle(ESQUISSE9_R)
        with Locations((10.5, 0)):
            Circle(ESQUISSE9_R)
    extrude(amount=ENL_V_MAT_EXTRU_8_DEPTH, mode=Mode.SUBTRACT)

    # Congé5
    cong_5_edges = [part.edges().sort_by_distance(p)[0] for p in [
        (7.5, 4.75, -2.645751311),
        (7.5, 4.75, 2.645751311),
        (-7.5, 4.75, -2.645751311),
        (-7.5, 4.75, 2.645751311),
    ]]
    fillet(cong_5_edges, radius=CONG_5_R)

    # Chanfrein2
    # the kernel refuses this chamfer: 1 mm, written as the material it takes off along each edge
    with BuildSketch(Plane(origin=(0, -8, 0), x_dir=(-1, 0, 0), z_dir=(0, 0, 1))) as chanfrein2_piece_1:
        Polygon((6.5 + CHANFREIN2_SIZE, 0), (6.5, -CHANFREIN2_SIZE), (6.5, 0), align=None)
    revolve(axis=Axis((0, -8, 0), (0, -1, 0)), mode=Mode.SUBTRACT)


solid = part.part
